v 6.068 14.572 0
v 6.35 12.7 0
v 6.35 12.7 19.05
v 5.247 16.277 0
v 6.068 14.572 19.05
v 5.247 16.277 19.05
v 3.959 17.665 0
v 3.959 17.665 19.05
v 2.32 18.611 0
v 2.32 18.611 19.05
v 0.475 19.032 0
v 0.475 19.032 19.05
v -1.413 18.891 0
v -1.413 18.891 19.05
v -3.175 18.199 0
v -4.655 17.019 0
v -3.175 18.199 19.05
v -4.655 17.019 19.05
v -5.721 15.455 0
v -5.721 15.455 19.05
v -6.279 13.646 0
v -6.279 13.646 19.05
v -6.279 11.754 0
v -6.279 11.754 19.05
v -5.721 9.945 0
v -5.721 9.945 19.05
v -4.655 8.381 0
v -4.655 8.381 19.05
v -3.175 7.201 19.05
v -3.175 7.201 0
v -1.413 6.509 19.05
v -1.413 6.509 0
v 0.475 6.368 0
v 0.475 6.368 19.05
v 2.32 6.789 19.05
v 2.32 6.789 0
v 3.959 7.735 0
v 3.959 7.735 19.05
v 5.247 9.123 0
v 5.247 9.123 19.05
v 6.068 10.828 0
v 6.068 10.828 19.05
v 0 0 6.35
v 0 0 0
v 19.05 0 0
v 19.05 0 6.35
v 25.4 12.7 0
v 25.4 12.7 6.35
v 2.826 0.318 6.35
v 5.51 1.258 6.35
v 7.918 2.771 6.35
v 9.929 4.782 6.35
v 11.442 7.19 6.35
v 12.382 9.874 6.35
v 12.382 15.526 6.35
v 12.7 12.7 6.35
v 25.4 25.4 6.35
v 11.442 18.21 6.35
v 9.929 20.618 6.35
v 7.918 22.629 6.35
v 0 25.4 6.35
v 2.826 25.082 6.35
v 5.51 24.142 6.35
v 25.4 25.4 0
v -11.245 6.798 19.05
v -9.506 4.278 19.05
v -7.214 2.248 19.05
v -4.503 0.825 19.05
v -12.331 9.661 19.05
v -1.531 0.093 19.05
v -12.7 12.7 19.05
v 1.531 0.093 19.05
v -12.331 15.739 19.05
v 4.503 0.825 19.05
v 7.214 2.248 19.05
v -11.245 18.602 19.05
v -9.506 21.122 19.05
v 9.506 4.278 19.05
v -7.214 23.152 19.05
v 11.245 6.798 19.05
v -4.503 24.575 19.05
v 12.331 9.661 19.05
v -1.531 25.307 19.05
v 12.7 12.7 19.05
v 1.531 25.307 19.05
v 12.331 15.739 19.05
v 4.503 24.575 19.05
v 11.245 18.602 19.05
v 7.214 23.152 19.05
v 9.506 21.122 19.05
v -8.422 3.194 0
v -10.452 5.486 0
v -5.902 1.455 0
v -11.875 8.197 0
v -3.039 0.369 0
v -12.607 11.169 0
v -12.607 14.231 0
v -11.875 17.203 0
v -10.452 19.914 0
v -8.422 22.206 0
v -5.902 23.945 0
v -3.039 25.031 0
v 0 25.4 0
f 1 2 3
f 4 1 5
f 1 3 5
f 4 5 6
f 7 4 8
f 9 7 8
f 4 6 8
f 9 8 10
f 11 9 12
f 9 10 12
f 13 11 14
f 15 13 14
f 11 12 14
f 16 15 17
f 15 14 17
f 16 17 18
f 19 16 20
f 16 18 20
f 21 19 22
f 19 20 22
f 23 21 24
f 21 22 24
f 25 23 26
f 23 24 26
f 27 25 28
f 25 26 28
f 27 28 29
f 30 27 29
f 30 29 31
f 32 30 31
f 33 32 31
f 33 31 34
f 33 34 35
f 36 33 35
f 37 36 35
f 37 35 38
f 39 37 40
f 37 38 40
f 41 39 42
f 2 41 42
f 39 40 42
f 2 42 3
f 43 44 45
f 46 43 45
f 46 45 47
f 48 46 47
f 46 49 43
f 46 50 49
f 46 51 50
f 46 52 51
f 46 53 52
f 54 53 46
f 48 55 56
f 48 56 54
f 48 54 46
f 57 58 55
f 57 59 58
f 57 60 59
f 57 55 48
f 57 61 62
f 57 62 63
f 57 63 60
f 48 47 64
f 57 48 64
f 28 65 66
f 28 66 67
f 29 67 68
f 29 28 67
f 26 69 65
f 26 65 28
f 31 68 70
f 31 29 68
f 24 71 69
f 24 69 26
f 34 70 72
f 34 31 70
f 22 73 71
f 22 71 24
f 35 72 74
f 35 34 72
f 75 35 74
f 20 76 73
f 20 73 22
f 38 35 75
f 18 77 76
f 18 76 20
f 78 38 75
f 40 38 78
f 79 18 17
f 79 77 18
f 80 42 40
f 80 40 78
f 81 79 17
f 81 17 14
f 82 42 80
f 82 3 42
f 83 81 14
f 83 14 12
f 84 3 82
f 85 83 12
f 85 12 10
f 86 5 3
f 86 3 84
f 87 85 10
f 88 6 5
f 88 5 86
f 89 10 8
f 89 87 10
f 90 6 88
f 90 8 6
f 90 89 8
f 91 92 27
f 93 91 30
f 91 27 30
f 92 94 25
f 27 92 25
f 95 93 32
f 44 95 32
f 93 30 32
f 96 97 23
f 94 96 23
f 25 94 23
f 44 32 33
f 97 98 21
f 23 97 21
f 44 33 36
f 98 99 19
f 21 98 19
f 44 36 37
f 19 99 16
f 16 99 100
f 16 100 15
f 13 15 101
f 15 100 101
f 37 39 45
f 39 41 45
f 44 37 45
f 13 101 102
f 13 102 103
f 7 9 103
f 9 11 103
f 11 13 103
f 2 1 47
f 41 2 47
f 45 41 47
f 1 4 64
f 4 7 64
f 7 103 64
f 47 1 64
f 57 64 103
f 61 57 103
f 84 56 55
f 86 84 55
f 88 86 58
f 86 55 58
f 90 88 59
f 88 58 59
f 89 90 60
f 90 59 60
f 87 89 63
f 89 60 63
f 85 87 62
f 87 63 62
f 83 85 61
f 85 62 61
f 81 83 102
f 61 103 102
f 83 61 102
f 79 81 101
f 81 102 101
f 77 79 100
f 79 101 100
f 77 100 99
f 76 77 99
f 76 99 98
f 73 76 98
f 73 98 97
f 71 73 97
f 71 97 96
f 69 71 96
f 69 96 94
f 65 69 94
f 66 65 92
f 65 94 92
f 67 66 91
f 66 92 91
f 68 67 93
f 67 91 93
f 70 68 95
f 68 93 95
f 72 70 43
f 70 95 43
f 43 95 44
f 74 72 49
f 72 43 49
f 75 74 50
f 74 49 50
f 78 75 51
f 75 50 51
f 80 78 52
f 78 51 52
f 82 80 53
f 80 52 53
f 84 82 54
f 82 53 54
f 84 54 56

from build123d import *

# Parameters (mm, degrees)
F1_DEPTH = 6.35
F2_R     = 12.7
F3_DEPTH = 12.7
F4_R     = 6.35
F5_DEPTH = 19.05


with BuildPart() as f1:
    # F0 (on Top) → F1 (new body)
    with BuildSketch(Plane.XY):
        with BuildLine():
            ThreePointArc((0, 25.4), (-12.7, 12.7), (0, 0))
            Line((0, 0), (19.05, 0))
            Line((19.05, 0), (25.4, 12.7))
            Line((25.4, 12.7), (25.4, 25.4))
            Line((25.4, 25.4), (0, 25.4))
        make_face()
    extrude(amount=F1_DEPTH)

    # F2 (on face) → F3 (join)
    with BuildSketch(Plane.XY.offset(6.35)):
        with Locations((0, 12.7)):
            Circle(F2_R)
    extrude(amount=F3_DEPTH)

    # F4 (on face) → F5 (cut)
    with BuildSketch(Plane.XY.offset(19.05)):
        with Locations((0, 12.7)):
            Circle(F4_R)
    extrude(amount=-F5_DEPTH, mode=Mode.SUBTRACT)


solid = f1.part
